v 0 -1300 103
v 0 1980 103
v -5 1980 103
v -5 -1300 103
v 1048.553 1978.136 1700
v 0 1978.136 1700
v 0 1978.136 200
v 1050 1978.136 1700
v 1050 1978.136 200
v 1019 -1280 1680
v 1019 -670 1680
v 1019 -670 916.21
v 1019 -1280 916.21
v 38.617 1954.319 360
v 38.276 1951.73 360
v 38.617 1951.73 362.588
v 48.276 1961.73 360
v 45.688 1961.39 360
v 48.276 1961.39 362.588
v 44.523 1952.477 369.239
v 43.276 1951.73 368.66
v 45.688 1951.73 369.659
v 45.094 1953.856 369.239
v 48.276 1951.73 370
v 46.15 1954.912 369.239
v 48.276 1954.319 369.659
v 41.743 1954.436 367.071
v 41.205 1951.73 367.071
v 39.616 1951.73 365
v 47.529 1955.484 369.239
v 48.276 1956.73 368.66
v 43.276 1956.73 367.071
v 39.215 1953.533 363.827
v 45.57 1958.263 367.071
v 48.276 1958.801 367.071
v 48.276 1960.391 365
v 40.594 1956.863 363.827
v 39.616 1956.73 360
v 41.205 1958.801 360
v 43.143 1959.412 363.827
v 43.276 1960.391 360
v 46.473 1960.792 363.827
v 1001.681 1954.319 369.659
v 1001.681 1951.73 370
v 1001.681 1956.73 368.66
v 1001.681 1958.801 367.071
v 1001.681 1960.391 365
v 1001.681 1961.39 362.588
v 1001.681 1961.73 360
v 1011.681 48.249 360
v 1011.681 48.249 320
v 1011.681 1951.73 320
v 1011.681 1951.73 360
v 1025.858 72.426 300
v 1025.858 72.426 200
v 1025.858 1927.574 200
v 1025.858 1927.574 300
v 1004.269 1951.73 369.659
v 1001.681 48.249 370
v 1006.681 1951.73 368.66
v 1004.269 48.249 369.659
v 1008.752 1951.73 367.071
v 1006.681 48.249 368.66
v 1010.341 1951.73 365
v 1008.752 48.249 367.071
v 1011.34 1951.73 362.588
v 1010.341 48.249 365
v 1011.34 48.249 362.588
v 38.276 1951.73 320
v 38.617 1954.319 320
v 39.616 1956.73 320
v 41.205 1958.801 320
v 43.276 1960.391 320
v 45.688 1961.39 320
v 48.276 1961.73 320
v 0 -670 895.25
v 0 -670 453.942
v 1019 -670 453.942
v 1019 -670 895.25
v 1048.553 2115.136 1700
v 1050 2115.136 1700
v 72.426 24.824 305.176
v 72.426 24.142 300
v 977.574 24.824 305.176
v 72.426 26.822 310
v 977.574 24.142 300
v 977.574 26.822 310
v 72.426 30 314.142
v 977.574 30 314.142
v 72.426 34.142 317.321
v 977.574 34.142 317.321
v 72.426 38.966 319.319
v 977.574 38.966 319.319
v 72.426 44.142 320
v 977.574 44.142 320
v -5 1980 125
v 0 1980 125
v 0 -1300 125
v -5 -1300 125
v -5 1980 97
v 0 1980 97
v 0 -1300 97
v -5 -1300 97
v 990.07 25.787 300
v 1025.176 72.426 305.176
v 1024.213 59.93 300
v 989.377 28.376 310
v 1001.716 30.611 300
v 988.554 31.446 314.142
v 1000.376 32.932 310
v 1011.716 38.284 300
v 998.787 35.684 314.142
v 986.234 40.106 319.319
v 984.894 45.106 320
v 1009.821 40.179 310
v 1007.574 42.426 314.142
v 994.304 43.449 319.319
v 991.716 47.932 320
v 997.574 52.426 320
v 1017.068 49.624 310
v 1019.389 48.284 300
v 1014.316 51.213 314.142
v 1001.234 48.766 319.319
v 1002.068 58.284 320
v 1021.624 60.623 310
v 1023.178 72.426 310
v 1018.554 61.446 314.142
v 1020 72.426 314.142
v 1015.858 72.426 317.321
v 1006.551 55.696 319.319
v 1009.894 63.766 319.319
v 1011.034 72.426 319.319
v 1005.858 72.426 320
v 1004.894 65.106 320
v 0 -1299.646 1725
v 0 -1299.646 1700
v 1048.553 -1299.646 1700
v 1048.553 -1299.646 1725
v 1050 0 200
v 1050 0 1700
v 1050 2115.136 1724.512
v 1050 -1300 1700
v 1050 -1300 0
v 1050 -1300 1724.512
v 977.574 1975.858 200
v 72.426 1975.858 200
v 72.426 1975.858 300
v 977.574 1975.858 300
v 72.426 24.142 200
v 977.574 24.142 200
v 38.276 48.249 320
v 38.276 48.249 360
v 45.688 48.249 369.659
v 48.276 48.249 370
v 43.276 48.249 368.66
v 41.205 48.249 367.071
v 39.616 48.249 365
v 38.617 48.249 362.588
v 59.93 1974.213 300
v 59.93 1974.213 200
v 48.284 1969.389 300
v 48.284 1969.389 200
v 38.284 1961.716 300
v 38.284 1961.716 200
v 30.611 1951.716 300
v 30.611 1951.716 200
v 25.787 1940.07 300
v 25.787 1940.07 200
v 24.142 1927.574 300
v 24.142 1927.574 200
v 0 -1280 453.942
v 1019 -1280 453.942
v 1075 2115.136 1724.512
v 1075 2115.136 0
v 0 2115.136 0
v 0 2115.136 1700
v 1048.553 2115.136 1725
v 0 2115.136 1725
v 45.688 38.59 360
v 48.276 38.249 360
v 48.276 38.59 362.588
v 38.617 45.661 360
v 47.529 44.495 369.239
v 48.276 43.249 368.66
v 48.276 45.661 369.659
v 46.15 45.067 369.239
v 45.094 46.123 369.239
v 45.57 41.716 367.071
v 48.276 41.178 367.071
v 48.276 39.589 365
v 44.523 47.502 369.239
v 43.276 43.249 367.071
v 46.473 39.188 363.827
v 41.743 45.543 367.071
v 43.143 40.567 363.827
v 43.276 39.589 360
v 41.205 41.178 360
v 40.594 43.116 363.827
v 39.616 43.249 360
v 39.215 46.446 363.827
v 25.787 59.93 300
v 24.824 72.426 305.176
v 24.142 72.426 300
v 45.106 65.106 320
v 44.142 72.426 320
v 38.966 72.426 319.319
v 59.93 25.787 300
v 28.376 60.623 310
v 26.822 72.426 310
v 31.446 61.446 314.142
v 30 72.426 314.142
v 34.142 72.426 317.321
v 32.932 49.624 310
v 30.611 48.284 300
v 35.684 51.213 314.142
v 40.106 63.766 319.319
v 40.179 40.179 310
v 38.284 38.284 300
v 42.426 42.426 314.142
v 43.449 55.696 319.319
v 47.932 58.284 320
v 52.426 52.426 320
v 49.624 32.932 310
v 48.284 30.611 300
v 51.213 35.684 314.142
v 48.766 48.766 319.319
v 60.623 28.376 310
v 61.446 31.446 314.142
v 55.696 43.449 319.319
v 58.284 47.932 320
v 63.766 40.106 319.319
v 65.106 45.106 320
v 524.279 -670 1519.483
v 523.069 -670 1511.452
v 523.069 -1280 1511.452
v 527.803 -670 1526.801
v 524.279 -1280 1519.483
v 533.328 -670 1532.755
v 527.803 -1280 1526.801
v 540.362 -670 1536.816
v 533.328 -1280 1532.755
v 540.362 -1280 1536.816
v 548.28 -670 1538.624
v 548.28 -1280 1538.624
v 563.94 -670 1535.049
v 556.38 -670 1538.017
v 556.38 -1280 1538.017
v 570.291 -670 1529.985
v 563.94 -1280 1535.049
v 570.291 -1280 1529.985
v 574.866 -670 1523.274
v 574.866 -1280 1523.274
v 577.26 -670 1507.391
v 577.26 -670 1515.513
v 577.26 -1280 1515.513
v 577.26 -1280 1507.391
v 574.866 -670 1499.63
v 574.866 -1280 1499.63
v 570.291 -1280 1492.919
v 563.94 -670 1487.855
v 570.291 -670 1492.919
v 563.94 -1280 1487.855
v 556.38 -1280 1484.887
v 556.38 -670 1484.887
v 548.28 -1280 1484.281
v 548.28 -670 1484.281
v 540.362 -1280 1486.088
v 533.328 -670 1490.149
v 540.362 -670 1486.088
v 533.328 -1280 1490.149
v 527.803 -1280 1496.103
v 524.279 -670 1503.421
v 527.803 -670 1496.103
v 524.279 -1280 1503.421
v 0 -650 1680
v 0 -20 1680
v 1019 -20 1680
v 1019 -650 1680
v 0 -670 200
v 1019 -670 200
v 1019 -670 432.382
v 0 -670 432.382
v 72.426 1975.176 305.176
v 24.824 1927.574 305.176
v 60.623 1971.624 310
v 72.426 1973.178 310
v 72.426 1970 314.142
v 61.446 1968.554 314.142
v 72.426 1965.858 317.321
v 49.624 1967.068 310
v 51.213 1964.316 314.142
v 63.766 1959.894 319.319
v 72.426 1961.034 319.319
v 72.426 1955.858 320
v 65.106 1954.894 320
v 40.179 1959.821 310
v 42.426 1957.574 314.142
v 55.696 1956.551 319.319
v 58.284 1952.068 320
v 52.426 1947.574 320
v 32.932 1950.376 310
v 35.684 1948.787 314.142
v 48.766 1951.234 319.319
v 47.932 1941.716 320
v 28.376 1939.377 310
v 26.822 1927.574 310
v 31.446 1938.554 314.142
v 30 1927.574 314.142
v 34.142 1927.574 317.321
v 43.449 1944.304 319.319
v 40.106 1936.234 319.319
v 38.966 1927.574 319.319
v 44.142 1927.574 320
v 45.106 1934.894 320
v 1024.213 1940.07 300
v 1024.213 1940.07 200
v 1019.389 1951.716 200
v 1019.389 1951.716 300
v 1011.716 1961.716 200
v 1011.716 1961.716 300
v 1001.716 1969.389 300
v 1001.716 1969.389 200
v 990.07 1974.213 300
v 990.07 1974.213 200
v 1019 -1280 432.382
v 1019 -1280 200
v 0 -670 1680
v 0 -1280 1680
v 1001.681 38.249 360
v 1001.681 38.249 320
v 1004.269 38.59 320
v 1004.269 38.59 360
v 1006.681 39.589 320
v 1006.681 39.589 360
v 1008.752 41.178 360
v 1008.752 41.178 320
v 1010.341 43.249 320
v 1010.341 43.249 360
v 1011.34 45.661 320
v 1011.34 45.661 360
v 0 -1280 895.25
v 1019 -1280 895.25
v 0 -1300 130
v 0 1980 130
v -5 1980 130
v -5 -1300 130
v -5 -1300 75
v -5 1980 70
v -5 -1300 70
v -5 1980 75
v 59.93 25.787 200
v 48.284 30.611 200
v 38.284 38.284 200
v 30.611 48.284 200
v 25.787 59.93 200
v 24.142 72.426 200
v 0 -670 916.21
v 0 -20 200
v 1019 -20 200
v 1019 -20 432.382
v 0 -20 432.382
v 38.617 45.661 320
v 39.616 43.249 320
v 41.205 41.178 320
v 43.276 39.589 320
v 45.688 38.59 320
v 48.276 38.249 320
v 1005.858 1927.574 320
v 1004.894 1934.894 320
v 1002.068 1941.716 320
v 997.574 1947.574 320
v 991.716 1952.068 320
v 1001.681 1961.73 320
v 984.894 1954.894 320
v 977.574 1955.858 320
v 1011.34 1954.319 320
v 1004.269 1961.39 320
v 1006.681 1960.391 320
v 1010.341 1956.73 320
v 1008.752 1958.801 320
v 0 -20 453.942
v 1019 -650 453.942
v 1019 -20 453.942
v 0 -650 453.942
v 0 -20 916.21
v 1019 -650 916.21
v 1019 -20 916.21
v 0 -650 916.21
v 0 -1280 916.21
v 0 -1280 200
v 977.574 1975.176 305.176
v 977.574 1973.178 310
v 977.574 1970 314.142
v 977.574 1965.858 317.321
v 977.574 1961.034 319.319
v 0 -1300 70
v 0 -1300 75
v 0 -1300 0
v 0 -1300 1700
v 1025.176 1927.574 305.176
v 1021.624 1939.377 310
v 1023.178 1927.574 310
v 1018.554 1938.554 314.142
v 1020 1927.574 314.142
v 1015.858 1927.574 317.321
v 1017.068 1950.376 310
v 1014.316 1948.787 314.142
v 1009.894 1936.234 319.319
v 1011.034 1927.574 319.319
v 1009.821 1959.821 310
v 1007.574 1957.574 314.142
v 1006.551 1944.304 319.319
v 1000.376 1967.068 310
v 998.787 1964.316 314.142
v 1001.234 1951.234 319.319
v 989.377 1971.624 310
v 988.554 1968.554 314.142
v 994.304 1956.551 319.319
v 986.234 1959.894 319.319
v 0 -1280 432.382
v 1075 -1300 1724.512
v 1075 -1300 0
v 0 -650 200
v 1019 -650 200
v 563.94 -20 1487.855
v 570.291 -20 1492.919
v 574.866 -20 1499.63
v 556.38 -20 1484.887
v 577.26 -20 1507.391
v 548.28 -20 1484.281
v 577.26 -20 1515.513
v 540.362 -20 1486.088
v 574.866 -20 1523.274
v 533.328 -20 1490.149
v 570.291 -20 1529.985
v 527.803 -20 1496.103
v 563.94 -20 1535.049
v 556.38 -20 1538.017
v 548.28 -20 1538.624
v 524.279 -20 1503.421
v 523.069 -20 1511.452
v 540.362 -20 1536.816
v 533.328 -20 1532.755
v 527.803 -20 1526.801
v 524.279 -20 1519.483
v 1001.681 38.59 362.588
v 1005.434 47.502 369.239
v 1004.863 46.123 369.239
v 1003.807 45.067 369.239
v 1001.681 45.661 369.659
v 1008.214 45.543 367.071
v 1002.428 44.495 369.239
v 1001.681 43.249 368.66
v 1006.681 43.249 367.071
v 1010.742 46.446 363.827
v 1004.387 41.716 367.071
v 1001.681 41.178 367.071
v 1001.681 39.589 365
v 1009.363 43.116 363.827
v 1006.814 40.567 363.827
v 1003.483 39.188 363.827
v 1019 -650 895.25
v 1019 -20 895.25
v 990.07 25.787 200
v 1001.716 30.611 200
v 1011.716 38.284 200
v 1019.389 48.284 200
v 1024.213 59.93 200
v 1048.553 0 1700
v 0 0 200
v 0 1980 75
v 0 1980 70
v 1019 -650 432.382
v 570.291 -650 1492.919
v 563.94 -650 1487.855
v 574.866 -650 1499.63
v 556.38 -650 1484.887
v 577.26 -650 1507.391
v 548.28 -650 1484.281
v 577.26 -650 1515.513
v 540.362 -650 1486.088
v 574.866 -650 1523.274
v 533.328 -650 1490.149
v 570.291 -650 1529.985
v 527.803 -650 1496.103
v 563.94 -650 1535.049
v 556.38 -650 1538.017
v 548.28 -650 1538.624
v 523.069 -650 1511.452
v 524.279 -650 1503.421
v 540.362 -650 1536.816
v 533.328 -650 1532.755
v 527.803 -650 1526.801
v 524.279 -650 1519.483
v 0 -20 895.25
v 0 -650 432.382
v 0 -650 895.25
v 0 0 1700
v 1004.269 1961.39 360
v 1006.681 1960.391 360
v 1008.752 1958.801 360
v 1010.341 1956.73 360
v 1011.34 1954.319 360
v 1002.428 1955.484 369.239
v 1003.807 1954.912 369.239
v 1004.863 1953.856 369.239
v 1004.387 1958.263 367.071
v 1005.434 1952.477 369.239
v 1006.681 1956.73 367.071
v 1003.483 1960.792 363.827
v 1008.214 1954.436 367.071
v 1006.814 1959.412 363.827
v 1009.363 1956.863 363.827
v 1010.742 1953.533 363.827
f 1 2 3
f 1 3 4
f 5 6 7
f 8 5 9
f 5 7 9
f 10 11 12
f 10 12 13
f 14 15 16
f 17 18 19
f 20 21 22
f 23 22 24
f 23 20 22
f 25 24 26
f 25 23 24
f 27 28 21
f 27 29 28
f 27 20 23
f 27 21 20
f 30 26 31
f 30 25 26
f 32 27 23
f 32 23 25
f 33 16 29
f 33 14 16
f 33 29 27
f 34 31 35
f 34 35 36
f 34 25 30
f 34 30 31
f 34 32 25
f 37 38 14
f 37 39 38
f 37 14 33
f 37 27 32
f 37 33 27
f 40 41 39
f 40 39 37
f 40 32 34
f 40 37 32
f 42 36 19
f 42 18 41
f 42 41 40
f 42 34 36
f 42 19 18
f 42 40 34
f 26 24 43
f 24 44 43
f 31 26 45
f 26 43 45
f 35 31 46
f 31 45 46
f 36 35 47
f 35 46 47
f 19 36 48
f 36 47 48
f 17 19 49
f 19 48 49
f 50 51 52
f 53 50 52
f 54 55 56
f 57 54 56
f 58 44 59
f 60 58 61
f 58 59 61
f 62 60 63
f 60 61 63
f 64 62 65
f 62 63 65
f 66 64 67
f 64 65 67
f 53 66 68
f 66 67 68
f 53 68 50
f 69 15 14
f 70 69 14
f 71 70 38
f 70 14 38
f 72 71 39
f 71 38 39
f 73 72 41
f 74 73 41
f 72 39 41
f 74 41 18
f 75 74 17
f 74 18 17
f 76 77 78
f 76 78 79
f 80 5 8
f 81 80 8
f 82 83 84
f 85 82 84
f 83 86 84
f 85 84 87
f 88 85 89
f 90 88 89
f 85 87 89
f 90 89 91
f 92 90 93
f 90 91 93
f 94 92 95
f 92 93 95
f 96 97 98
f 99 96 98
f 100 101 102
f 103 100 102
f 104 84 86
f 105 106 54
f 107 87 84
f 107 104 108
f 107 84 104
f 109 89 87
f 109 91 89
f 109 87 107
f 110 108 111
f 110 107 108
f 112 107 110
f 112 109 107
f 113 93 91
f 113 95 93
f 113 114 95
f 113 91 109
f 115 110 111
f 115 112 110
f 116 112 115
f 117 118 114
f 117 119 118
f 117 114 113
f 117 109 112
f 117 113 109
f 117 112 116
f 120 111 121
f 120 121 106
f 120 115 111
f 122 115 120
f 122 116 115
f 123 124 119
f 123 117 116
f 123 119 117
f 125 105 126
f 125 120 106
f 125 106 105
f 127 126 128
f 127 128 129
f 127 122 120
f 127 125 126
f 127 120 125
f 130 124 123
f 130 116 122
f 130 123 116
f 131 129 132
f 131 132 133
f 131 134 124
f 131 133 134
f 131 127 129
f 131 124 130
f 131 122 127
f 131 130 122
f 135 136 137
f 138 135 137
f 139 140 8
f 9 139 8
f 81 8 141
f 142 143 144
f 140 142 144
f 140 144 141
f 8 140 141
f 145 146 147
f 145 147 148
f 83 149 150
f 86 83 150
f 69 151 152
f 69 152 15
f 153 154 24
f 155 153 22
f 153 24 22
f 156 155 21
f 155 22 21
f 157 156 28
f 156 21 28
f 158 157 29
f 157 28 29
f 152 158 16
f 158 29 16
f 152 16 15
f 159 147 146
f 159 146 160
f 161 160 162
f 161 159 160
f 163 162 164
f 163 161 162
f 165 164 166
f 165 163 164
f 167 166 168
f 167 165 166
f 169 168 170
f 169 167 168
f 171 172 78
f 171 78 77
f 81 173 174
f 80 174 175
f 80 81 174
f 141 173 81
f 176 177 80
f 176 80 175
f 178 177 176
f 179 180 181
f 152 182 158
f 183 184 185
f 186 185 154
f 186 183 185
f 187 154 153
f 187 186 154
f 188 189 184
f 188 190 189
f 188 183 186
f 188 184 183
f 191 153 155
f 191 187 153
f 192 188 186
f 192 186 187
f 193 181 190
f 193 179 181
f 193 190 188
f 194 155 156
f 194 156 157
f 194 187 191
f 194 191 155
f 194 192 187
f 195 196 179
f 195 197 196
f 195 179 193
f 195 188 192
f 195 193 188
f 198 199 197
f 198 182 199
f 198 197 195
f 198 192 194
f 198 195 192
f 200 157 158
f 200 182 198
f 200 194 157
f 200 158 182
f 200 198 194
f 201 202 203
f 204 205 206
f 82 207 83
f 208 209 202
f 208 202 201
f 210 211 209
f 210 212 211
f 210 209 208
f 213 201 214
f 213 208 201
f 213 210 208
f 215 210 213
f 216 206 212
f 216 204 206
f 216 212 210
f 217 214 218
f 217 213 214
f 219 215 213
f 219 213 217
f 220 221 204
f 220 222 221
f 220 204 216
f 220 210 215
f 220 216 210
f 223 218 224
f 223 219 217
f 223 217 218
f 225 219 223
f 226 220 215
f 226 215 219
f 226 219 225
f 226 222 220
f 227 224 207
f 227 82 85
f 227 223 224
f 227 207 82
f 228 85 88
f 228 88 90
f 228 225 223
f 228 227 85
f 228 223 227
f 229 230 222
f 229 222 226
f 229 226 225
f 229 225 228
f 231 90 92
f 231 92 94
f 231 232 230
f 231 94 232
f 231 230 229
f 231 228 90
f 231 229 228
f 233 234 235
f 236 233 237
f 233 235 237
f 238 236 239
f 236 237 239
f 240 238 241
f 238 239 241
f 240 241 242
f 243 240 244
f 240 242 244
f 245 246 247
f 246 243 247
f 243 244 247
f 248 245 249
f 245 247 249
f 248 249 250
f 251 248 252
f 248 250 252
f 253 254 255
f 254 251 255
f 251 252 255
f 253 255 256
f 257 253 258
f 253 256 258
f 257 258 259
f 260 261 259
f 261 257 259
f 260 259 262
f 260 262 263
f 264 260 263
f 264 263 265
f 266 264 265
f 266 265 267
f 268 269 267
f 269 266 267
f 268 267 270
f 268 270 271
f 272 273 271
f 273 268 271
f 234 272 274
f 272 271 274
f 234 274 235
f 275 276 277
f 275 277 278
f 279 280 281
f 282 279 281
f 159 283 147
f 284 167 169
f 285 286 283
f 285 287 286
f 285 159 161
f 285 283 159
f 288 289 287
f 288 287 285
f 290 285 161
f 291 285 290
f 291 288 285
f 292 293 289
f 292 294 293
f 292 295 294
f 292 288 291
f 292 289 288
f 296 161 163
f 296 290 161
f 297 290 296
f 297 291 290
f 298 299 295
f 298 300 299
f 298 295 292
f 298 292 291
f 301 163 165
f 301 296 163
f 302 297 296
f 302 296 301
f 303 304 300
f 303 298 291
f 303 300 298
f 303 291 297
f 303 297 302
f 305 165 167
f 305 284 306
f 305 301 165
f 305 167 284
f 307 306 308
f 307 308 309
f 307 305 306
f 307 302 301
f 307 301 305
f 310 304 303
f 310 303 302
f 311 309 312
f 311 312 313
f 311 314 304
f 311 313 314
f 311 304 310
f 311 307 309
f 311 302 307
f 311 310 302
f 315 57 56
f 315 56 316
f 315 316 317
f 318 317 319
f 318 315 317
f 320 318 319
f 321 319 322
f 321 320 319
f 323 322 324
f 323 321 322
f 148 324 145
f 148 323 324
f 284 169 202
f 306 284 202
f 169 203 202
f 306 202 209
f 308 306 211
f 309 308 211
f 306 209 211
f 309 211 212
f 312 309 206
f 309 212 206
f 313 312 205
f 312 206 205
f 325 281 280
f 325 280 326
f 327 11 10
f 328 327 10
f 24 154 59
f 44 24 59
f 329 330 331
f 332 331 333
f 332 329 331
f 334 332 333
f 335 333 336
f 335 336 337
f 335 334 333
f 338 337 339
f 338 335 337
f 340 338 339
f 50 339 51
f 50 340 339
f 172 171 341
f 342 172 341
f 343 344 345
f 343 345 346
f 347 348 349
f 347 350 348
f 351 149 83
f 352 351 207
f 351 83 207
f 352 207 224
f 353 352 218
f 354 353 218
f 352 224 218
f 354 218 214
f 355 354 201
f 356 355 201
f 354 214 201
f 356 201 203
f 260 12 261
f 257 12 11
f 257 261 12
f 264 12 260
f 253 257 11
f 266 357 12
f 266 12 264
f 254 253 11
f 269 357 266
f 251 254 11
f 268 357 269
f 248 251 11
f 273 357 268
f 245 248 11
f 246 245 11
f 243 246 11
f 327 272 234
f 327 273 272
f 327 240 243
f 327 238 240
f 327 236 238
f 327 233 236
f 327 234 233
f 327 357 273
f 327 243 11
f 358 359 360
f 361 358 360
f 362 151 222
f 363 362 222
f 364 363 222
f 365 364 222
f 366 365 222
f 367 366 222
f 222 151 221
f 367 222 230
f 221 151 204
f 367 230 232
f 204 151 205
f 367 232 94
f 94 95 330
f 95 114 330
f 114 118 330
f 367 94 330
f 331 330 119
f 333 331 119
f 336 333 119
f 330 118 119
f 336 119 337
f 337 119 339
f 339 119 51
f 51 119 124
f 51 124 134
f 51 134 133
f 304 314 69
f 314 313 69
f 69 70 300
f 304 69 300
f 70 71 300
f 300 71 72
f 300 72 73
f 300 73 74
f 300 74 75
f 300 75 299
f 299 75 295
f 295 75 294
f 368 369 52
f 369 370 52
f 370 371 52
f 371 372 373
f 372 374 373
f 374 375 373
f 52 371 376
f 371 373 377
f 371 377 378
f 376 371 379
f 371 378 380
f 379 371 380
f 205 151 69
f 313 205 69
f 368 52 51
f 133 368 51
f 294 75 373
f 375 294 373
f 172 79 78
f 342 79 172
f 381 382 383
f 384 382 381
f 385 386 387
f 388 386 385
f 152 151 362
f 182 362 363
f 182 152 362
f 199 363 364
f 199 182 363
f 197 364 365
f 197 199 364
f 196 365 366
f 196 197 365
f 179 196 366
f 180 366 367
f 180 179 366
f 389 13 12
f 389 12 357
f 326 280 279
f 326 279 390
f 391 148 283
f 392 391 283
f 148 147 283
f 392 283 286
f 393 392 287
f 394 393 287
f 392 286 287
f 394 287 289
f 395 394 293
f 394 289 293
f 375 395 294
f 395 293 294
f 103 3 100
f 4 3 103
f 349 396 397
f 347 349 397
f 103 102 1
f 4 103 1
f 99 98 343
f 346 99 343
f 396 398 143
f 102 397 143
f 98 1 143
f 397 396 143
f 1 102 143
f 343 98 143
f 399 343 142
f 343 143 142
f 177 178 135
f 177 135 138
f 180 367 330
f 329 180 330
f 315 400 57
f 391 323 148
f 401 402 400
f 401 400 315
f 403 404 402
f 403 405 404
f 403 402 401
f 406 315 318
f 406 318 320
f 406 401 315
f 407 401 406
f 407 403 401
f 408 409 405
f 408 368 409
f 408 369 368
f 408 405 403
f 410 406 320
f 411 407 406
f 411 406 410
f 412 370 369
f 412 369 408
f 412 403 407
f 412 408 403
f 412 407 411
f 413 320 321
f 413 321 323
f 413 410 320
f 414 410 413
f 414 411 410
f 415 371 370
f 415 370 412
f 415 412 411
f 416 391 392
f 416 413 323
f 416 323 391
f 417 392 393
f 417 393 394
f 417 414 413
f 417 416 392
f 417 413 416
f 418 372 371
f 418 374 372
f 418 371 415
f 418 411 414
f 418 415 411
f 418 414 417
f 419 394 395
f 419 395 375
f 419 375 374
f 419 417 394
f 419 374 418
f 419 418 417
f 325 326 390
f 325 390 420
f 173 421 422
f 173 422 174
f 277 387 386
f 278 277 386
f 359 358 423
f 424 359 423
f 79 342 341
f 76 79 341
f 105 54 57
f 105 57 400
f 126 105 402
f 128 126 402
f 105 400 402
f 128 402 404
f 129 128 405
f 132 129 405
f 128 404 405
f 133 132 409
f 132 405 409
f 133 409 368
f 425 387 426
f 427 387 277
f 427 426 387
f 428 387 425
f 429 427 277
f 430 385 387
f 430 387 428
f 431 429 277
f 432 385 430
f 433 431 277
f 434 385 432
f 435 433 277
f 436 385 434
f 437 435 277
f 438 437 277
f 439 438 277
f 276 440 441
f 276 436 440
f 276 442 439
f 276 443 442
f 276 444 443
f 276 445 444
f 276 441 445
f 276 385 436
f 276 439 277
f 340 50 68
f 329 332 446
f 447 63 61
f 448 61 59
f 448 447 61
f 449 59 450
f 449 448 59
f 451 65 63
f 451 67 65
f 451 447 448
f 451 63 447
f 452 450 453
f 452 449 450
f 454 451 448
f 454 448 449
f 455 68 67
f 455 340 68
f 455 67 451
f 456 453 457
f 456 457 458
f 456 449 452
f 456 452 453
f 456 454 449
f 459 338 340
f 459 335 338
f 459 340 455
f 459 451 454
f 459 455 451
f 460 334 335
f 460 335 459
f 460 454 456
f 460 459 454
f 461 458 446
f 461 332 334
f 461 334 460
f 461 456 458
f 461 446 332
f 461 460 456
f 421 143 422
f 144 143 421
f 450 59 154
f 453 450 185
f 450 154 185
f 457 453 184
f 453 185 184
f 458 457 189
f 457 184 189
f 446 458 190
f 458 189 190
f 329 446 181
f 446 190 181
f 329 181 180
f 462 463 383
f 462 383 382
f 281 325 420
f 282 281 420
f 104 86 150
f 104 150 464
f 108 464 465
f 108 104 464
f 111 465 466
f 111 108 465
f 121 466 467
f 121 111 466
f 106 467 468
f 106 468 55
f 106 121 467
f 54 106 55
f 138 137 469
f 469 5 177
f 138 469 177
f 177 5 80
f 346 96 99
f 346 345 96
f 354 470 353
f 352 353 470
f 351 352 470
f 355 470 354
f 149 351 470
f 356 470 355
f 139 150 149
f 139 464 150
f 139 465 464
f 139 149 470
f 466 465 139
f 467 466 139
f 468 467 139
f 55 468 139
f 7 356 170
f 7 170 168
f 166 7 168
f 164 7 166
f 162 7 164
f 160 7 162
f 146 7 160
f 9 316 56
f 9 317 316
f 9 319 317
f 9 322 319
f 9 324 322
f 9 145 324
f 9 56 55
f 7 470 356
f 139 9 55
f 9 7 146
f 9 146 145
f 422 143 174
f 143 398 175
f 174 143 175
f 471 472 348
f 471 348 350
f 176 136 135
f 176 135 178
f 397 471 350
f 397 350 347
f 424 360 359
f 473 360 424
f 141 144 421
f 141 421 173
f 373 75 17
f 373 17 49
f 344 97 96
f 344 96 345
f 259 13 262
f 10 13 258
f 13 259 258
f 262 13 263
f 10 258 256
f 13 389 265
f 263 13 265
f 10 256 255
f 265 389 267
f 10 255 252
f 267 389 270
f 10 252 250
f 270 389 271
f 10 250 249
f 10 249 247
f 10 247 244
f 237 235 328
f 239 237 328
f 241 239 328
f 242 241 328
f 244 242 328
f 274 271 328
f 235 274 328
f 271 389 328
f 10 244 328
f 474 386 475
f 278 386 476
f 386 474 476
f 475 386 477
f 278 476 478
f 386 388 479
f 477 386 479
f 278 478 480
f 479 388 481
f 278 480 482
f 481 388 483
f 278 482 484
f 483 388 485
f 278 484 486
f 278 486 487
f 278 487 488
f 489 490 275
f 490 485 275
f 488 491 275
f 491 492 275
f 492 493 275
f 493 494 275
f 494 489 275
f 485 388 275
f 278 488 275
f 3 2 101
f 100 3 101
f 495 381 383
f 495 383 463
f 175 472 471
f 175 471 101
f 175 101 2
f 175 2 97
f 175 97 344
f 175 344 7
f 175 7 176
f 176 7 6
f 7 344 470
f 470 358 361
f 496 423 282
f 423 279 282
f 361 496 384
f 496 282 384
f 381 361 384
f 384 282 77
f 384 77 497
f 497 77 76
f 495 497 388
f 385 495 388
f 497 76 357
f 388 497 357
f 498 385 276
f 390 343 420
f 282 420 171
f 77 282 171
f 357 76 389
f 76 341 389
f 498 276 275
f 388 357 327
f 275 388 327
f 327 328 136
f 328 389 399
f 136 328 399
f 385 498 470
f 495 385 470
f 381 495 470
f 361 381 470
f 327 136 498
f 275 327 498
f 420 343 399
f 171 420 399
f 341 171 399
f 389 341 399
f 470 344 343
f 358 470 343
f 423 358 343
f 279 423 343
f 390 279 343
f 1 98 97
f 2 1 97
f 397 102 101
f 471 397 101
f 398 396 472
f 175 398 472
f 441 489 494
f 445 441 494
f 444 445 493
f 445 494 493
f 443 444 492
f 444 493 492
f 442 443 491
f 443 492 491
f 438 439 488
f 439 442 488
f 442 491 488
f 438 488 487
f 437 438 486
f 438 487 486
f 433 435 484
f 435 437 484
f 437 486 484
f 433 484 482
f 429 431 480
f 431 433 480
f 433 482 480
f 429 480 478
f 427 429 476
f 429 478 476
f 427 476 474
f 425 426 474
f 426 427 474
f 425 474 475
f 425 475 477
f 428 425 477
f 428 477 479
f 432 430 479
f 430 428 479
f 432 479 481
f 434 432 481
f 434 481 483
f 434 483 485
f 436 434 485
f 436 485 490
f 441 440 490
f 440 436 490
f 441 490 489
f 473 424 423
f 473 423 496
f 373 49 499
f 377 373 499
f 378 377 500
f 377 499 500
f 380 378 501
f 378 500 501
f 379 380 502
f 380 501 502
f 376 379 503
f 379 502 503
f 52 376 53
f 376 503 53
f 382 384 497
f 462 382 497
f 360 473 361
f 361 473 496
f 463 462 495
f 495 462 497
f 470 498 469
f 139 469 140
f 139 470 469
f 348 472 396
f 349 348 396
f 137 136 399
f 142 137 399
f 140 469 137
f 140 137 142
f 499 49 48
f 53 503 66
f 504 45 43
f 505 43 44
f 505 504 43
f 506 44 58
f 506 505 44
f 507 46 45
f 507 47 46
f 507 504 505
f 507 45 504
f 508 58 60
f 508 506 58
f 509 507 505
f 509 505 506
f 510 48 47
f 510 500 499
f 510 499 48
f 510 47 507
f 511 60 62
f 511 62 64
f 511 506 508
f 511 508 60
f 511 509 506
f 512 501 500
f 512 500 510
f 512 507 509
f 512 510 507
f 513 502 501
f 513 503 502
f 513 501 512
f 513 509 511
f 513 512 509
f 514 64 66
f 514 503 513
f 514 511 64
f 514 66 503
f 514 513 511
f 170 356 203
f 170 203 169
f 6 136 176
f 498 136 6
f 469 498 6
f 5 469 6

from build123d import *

# Parameters (mm, degrees)
F0_W      = 1050
F0_H      = 2000
F1_DEPTH  = 200
F2_SIZE   = 20
F3_W      = 1001.715728
F3_H      = 1951.715728
F4_DEPTH  = 120
F5_R      = 48.284271
F6_R      = 20
F7_W      = 973.405205
F7_H      = 1923.481565
F8_DEPTH  = 50
F9_R      = 10
F10_R     = 10
F11_W     = 1960
F11_H     = 5
F11_H_2   = 3
F12_DEPTH = 5
F13_W     = 1050
F13_H     = 1300
F14_DEPTH = 200
F15_W     = 1050
F15_H     = 1300
F16_DEPTH = 1500
F17_W     = 610
F17_H     = 1480
F17_W_2   = 630
F18_DEPTH = 1019
F19_W     = 1320
F19_H     = 5
F19_H_2   = 6
F20_DEPTH = 5
F21_W     = 1061.661
F21_H     = 1222
F22_DEPTH = 1700
F23_W     = 35.6673
F23_H     = 1700
F23_W_2   = 39.648295
F24_DEPTH = 95
F25_R     = 17.675131
F25_R_2   = 26.491418
F25_R_3   = 28.49172
F25_R_4   = 25.461441
F25_R_5   = 22.122268
F25_R_6   = 26.790347
F25_R_7   = 26.844984
F25_R_8   = 29.855992
F25_R_9   = 34.523428
F25_R_10  = 18.483208
F25_R_11  = 24.436563
F25_R_12  = 26.49164
F25_R_13  = 18.371691
F25_R_14  = 19.135028
F25_R_15  = 20
F26_DEPTH = 365
F27_W     = 1048.552871
F27_H     = 4499.781487
F28_DEPTH = 25
F29_W     = 4499.939489
F29_H     = 1724.511504
F30_DEPTH = 25
F31_W     = 1255.993739
F31_H     = 1847.933241
F32_DEPTH = 1180
F33_R     = 27.247756
F34_DEPTH = 1280
F35_W     = 1019
F35_H     = 21.559715
F36_DEPTH = 1272
F37_W     = 1019
F37_H     = 20.960152
F38_DEPTH = 1280


with BuildPart() as f1:
    # F0 (on Top) → F1 (new body)
    with BuildSketch(Plane.XY):
        with Locations((525, 1000)):
            Rectangle(F0_W, F0_H)
    extrude(amount=F1_DEPTH)

    # F2
    f2_edges = [f1.edges().sort_by_distance(p)[0] for p in [
        (1050, 2000, 100),
        (0, 2000, 100),
    ]]
    chamfer(f2_edges, length=F2_SIZE)

    # F3 (on face) → F4 (join)
    with BuildSketch(Plane.XY.offset(200)):
        with Locations((525, 1000)):
            Rectangle(F3_W, F3_H)
    extrude(amount=F4_DEPTH)

    # F5
    f5_edges = [f1.edges().sort_by_distance(p)[0] for p in [
        (1025.857864, 24.142136, 260),
        (1025.857864, 1975.857864, 260),
        (24.142136, 1975.857864, 260),
        (24.142136, 24.142136, 260),
    ]]
    fillet(f5_edges, radius=F5_R)

    # F6
    f6_edges = [f1.edges().sort_by_distance(p)[0] for p in [
        (525, 24.142136, 320),
        (38.284271, 38.284271, 320),
        (1011.715729, 38.284271, 320),
        (24.142136, 1000, 320),
        (1025.857864, 1000, 320),
        (38.284271, 1961.715729, 320),
        (1011.715729, 1961.715729, 320),
        (525, 1975.857864, 320),
    ]]
    fillet(f6_edges, radius=F6_R)

    # F7 (on face) → F8 (join)
    with BuildSketch(Plane.XY.offset(320)):
        with Locations((524.978477, 999.989578)):
            Rectangle(F7_W, F7_H)
    extrude(amount=F8_DEPTH)

    # F9
    f9_edges = [f1.edges().sort_by_distance(p)[0] for p in [
        (1011.68108, 38.248796, 345),
        (1011.68108, 1961.730361, 345),
        (38.275875, 1961.730361, 345),
        (38.275875, 38.248796, 345),
    ]]
    fillet(f9_edges, radius=F9_R)

    # F10
    f10_edges = [f1.edges().sort_by_distance(p)[0] for p in [
        (524.978478, 1961.730361, 370),
        (1008.752148, 1958.801429, 370),
        (41.204807, 1958.801429, 370),
        (1011.68108, 999.989579, 370),
        (38.275875, 999.989579, 370),
        (1008.752148, 41.177728, 370),
        (41.204807, 41.177728, 370),
        (524.978478, 38.248796, 370),
    ]]
    fillet(f10_edges, radius=F10_R)

    # F11 (on face) → F12 (join)
    with BuildSketch(Plane(origin=(0, 0, 0), x_dir=(0, -1, 0), z_dir=(-1, 0, 0))):
        with Locations((-1000, 72.5)):
            Rectangle(F11_W, F11_H)
        with Locations((-1000, 127.5)):
            Rectangle(F11_W, F11_H)
        with Locations((-1000, 98.5)):
            Rectangle(F11_W, F11_H_2)
        with Locations((-1000, 101.5)):
            Rectangle(F11_W, F11_H_2)
    extrude(amount=F12_DEPTH)

    # F13 (on Top) → F14 (join)
    with BuildSketch(Plane.XY):
        with Locations((525, -650)):
            Rectangle(F13_W, F13_H)
    extrude(amount=F14_DEPTH)

    # F15 (on face) → F16 (join)
    with BuildSketch(Plane.XY.offset(200)):
        with Locations((525, -650)):
            Rectangle(F15_W, F15_H)
    extrude(amount=F16_DEPTH)

    # F17 (on face) → F18 (cut)
    with BuildSketch(Plane(origin=(0, 0, 0), x_dir=(0, -1, 0), z_dir=(-1, 0, 0))):
        with Locations((975, 940)):
            Rectangle(F17_W, F17_H)
        with Locations((335, 940)):
            Rectangle(F17_W_2, F17_H)
    extrude(amount=-F18_DEPTH, mode=Mode.SUBTRACT)

    # F19 (on face) → F20 (join)
    with BuildSketch(Plane(origin=(0, 0, 0), x_dir=(0, -1, 0), z_dir=(-1, 0, 0))):
        with Locations((640, 127.5)):
            Rectangle(F19_W, F19_H)
        with Locations((640, 100)):
            Rectangle(F19_W, F19_H_2)
        with Locations((640, 72.5)):
            Rectangle(F19_W, F19_H)
    extrude(amount=F20_DEPTH)

    # F21 (on Top) → F22 (join)
    with BuildSketch(Plane.XY):
        with Locations((530.8305, 2589.135705)):
            Rectangle(F21_W, F21_H)
    extrude(amount=F22_DEPTH)

    # F23 (on face) → F24 (join)
    with BuildSketch(Plane(origin=(0, 3200.135705, 0), x_dir=(-1, 0, 0), z_dir=(0, 1, 0))):
        with Locations((-305.102706, 850)):
            Rectangle(F23_W, F23_H)
        with Locations((-695.655286, 850)):
            Rectangle(F23_W_2, F23_H)
    extrude(amount=F24_DEPTH)

    # F25 (on face) → F26 (join)
    with BuildSketch(Plane(origin=(675.831139, 0, 0), x_dir=(0, -1, 0), z_dir=(-1, 0, 0))):
        with Locations((-3252.88574, 135.192228)):
            Circle(F25_R)
        with Locations((-3254.491696, 222.675777)):
            Circle(F25_R_2)
        with Locations((-3248.258108, 335.374969)):
            Circle(F25_R_3)
        with Locations((-3249.734309, 494.146231)):
            Circle(F25_R_4)
        with Locations((-3252.811319, 419.299844)):
            Circle(F25_R_5)
        with Locations((-3253.401542, 580.157127)):
            Circle(F25_R_6)
        with Locations((-3251.752263, 678.684019)):
            Circle(F25_R_7)
        with Locations((-3255.381964, 785.062628)):
            Circle(F25_R_8)
        with Locations((-3254.409769, 915.7977)):
            Circle(F25_R_9)
        with Locations((-3239.505991, 1025.246616)):
            Circle(F25_R_10)
        with Locations((-3245.394067, 1183.771719)):
            Circle(F25_R_11)
        with Locations((-3251.762343, 1320.886005)):
            Circle(F25_R_12)
        with Locations((-3255.527804, 1433.706561)):
            Circle(F25_R_13)
        with Locations((-3246.574513, 1505.486339)):
            Circle(F25_R_14)
        with Locations((-3261.742305, 1574.563252)):
            Circle(F25_R_15)
    extrude(amount=F26_DEPTH)

    # F27 (on face) → F28 (join)
    with BuildSketch(Plane.XY.offset(1700)):
        with Locations((524.276435, 950.244961)):
            Rectangle(F27_W, F27_H)
    extrude(amount=F28_DEPTH)

    # F29 (on face) → F30 (join)
    with BuildSketch(Plane.YZ.offset(1050)):
        with Locations((949.969744, 862.255752)):
            Rectangle(F29_W, F29_H)
    extrude(amount=F30_DEPTH)

    # F31 (on face) → F32 (cut)
    with BuildSketch(Plane(origin=(0, 3295.135705, 0), x_dir=(-1, 0, 0), z_dir=(0, 1, 0))):
        with Locations((-495.492868, 829.507138)):
            Rectangle(F31_W, F31_H)
    extrude(amount=-F32_DEPTH, mode=Mode.SUBTRACT)

    # F33 (on face) → F34 (join)
    with BuildSketch(Plane(origin=(0, -1280, 0), x_dir=(-1, 0, 0), z_dir=(0, 1, 0))):
        with Locations((-550.316572, 1511.452079)):
            Circle(F33_R)
    extrude(amount=F34_DEPTH)

    # F35 (on face) → F36 (join)
    with BuildSketch(Plane(origin=(0, -1280, 0), x_dir=(-1, 0, 0), z_dir=(0, 1, 0))):
        with Locations((-509.5, 443.162262)):
            Rectangle(F35_W, F35_H)
    extrude(amount=F36_DEPTH)

    # F37 (on face) → F38 (join)
    with BuildSketch(Plane(origin=(0, -1280, 0), x_dir=(-1, 0, 0), z_dir=(0, 1, 0))):
        with Locations((-509.5, 905.730277)):
            Rectangle(F37_W, F37_H)
    extrude(amount=F38_DEPTH)


solid = f1.part
